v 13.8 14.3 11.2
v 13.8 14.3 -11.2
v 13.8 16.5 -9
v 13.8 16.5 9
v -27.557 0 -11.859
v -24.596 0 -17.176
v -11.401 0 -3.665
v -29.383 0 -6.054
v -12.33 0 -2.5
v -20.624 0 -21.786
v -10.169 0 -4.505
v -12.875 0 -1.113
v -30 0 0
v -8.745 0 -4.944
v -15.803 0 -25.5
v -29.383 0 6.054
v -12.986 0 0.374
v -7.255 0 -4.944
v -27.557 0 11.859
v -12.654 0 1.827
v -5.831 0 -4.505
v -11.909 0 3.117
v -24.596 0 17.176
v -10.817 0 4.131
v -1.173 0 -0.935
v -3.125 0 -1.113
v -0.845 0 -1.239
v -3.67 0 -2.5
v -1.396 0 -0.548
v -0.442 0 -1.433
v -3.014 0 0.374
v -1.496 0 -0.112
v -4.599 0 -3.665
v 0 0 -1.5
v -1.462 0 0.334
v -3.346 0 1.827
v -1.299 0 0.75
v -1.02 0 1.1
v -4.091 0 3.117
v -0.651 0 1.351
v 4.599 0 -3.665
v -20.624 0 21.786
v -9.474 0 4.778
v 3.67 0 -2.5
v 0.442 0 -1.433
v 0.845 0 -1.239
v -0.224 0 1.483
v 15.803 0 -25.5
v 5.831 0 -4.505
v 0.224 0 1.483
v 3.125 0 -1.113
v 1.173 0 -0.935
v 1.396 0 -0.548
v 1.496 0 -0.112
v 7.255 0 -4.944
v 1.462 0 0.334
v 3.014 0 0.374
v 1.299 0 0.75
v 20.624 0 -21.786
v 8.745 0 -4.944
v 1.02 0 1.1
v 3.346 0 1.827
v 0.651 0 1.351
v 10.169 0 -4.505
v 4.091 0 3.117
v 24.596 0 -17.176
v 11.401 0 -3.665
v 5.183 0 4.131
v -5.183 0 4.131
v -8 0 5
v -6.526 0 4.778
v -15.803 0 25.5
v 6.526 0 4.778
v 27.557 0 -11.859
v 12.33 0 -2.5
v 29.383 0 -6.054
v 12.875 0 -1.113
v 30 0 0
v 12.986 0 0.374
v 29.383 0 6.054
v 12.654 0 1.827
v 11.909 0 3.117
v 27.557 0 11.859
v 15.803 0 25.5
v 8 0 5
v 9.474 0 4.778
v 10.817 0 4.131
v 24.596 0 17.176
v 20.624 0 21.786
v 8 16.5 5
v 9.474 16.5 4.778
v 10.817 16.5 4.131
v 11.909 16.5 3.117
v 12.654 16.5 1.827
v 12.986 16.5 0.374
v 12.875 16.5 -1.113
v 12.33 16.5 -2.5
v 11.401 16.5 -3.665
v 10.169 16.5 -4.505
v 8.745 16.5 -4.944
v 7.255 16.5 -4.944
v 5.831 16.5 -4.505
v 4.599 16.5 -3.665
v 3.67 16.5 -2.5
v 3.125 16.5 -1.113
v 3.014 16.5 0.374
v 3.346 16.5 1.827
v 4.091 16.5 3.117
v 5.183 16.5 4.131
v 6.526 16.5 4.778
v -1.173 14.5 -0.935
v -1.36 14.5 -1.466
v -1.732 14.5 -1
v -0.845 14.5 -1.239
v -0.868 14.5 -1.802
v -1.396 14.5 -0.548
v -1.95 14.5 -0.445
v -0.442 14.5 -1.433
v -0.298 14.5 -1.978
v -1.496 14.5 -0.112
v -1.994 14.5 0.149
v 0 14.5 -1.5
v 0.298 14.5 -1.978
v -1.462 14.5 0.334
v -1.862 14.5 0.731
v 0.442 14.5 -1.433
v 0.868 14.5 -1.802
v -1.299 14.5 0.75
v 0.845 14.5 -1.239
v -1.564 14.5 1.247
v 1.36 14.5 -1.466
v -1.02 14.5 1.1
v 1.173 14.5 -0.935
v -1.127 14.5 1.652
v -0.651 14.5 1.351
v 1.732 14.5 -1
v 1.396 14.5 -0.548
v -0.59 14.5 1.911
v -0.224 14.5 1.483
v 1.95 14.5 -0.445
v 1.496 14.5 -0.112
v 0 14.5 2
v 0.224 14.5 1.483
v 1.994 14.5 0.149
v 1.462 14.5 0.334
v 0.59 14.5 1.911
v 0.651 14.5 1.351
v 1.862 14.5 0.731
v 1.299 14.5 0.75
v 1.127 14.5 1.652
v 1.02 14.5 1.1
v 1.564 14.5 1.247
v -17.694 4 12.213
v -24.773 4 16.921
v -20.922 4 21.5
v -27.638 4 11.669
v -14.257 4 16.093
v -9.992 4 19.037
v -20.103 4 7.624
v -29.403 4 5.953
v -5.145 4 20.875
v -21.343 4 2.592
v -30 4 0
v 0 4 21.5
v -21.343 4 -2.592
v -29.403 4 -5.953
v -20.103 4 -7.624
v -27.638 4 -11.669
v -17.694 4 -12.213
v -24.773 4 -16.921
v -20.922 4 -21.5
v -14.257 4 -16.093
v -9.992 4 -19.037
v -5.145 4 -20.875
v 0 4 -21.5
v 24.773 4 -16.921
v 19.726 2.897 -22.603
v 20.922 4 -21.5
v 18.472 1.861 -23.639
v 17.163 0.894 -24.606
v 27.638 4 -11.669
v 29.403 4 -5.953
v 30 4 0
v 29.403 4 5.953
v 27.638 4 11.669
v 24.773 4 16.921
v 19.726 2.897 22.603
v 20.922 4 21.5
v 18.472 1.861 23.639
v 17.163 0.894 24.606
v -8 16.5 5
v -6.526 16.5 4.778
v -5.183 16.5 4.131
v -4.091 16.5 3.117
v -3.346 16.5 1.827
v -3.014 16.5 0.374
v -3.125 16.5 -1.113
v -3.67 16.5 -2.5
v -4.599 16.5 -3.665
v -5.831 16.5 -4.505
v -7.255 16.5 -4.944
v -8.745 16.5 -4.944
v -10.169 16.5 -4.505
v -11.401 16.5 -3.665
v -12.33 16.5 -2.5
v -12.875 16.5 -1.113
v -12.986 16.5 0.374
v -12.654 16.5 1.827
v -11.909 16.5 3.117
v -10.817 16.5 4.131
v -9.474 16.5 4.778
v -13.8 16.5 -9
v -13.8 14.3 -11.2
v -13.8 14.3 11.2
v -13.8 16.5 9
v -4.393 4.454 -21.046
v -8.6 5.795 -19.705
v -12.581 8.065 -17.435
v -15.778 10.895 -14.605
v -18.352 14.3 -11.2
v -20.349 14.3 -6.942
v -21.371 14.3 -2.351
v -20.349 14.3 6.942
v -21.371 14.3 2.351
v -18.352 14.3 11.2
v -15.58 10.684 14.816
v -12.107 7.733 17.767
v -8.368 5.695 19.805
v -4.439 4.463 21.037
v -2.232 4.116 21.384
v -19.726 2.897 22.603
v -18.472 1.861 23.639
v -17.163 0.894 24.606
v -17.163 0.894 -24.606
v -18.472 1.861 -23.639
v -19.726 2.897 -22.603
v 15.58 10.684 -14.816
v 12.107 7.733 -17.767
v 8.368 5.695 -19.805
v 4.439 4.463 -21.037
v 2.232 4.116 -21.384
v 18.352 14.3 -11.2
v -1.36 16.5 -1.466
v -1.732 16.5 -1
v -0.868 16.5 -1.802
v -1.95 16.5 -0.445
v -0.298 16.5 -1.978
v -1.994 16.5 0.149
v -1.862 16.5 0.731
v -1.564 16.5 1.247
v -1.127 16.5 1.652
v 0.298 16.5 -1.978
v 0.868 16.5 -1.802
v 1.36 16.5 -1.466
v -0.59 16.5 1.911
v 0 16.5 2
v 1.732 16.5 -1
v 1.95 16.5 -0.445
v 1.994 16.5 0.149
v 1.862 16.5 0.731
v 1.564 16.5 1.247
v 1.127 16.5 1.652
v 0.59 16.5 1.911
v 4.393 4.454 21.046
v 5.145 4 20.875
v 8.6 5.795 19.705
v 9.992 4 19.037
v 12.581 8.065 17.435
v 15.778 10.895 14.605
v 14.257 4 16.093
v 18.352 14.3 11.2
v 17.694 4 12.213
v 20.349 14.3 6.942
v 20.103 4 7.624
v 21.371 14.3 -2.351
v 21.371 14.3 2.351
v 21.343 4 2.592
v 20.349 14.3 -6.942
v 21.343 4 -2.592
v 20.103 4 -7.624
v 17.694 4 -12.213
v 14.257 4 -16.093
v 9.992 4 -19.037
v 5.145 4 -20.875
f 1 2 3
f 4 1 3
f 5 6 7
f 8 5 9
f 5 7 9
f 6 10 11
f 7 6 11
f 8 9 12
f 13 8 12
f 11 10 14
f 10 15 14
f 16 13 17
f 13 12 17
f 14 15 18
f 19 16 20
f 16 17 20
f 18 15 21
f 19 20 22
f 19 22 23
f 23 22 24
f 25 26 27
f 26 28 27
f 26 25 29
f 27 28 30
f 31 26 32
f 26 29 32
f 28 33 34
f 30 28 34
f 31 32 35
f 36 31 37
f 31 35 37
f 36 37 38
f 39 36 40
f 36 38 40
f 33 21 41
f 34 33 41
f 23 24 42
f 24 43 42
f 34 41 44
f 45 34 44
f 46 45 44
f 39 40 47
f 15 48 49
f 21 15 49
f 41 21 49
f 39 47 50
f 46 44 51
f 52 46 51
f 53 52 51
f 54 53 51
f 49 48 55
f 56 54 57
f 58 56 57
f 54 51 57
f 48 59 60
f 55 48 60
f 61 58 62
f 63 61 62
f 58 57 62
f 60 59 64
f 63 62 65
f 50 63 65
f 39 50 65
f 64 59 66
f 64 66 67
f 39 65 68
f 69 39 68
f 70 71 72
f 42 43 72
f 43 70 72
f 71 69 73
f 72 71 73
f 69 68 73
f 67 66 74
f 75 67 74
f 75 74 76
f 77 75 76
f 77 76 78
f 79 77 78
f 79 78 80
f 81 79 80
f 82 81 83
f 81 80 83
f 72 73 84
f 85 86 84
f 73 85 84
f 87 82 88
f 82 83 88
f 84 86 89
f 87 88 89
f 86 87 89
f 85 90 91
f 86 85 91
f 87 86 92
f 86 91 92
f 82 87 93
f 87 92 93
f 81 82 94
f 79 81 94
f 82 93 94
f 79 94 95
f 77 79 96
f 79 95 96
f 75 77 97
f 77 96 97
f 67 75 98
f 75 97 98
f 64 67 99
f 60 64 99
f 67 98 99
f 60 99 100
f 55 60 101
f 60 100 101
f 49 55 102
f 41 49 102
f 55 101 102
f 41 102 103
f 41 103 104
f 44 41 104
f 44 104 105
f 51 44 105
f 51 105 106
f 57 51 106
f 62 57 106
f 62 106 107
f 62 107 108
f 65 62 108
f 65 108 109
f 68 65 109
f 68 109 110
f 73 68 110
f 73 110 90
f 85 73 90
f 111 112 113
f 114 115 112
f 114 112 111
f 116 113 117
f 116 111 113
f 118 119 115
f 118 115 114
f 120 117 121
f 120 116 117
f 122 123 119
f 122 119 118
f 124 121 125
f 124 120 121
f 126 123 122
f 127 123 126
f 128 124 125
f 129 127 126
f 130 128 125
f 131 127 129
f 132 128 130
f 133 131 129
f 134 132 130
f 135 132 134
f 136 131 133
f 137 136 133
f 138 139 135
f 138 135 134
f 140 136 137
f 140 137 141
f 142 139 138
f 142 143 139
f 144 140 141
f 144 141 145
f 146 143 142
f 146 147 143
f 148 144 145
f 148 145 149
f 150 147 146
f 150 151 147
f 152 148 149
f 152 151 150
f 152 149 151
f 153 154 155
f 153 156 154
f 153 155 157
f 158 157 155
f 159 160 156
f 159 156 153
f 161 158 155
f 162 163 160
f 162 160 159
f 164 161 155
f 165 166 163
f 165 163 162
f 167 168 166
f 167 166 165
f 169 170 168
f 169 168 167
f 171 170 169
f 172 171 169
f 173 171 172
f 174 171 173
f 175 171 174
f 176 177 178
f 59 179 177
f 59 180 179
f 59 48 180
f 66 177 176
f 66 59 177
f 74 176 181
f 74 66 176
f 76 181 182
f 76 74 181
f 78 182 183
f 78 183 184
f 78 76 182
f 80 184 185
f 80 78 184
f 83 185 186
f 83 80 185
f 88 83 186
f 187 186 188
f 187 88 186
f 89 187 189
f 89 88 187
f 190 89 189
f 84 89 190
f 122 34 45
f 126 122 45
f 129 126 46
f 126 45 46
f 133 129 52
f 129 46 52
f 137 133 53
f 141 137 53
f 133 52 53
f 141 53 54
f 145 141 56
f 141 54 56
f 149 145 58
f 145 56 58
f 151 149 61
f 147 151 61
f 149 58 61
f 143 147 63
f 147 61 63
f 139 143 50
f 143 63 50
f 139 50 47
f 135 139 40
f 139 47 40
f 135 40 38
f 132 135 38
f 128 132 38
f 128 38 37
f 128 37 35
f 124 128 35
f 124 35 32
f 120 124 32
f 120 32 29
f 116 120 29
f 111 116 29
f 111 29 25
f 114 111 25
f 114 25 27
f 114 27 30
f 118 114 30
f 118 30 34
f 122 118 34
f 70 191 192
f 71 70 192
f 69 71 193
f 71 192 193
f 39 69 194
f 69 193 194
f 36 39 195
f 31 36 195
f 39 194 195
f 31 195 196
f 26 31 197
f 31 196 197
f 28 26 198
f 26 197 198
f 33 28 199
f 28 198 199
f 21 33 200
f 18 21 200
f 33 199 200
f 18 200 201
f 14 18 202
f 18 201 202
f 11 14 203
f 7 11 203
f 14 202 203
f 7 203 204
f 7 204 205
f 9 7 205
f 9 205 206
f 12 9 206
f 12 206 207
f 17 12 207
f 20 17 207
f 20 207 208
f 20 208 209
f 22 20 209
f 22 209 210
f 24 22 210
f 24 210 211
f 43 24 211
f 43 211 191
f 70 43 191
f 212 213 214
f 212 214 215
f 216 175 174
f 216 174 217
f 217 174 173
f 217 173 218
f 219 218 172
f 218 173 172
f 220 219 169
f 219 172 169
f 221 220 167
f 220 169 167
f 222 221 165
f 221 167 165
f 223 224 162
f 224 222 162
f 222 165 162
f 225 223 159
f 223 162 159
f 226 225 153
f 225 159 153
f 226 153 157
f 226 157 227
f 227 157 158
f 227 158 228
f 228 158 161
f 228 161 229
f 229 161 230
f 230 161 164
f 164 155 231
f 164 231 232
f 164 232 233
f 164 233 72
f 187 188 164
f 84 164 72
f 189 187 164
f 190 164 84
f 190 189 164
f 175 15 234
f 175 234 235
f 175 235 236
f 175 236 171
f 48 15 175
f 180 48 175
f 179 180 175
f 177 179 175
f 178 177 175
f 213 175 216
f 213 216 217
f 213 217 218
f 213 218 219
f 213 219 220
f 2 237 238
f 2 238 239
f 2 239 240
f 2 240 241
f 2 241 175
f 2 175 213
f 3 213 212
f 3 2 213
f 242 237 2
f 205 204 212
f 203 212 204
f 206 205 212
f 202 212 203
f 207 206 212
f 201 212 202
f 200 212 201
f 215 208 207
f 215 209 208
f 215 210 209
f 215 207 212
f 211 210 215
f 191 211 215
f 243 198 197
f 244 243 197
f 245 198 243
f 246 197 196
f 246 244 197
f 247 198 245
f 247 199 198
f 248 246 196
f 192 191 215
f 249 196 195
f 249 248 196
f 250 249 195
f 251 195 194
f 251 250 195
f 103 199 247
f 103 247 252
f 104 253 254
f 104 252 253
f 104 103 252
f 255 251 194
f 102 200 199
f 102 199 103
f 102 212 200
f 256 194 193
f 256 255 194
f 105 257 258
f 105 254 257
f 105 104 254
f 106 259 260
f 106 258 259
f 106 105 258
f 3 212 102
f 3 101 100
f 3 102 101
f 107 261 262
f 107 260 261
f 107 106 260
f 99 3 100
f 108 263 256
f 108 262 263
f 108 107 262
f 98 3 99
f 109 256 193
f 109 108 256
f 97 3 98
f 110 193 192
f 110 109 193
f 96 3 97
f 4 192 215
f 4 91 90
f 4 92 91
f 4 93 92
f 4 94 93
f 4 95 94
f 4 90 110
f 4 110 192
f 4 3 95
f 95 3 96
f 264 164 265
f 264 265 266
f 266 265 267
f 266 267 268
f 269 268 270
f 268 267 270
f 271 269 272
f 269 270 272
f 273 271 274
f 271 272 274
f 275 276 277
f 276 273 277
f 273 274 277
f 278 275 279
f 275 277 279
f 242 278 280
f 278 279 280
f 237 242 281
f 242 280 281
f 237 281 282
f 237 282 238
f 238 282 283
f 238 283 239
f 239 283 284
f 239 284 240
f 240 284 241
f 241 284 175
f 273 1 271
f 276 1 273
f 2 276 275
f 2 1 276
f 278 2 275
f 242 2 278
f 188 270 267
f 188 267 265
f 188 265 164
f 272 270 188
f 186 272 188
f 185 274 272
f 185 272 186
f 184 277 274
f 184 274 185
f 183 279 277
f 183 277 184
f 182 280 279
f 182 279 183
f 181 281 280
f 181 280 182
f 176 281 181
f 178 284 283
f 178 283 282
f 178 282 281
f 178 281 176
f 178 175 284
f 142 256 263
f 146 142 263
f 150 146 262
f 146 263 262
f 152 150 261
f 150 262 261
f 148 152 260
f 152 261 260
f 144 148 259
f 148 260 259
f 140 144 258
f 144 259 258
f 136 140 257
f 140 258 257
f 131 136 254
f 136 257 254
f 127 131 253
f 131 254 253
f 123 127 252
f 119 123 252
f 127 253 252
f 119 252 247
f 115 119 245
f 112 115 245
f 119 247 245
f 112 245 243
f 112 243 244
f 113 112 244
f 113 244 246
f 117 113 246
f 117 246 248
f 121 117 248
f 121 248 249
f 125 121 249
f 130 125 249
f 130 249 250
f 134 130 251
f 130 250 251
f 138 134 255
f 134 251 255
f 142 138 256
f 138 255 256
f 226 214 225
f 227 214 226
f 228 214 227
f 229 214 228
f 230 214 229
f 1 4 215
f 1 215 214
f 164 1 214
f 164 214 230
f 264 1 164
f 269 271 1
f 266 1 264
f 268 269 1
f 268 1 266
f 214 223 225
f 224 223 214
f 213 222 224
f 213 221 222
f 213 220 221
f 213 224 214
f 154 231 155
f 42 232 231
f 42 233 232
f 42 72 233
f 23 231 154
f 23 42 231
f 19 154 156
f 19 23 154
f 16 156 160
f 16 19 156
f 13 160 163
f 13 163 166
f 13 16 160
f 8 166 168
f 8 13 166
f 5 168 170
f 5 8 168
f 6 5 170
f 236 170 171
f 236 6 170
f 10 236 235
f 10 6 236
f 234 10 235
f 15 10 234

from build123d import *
from build123d.topology import SkipClean

# Parameters (mm, degrees)
SKETCH1_R                            = 30
BOSS_EXTRUDE1_DEPTH                  = 4
BOSS_EXTRUDE2_REACH                  = 44.615
BOSS_EXTRUDE2_END_RADIUS             = 30
BOSS_EXTRUDE2_DIRECTION_2_REACH      = 44.615
BOSS_EXTRUDE2_DIRECTION_2_END_RADIUS = 30
SKETCH3_OUTSIDE_W                    = 78.092
SKETCH3_OUTSIDE_H                    = 69.092
SKETCH3_OUTSIDE_R                    = 21.5
CUT_EXTRUDE2_DEPTH                   = 12.5
BOSS_EXTRUDE3_DEPTH                  = 18
BOSS_EXTRUDE4_DEPTH                  = 15
BOSS_EXTRUDE5_DEPTH                  = 15
CUT_EXTRUDE3_DEPTH                   = 44.292609069
CUT_EXTRUDE3_DEPTH_BACK              = 44.292609069
SKETCH8_R                            = 2
CUT_EXTRUDE8_DEPTH                   = 48.077064479
CUT_EXTRUDE8_DEPTH_BACK              = 48.077064479
CUT_EXTRUDE9_DEPTH                   = 59.659818207
CUT_EXTRUDE11_DEPTH                  = 20
CUT_EXTRUDE12_DEPTH                  = 20
CUT_EXTRUDE13_DEPTH                  = 20
CUT_EXTRUDE14_DEPTH                  = 44.292609069
CUT_EXTRUDE14_DEPTH_BACK             = 44.292609069
SKETCH25_W                           = 66.075437062
SKETCH25_H                           = 20.142243048
SKETCH26_R                           = 5
CUT_EXTRUDE15_DEPTH                  = 24
CUT_EXTRUDE17_DEPTH                  = 47.524187258
CUT_EXTRUDE17_DEPTH_BACK             = 47.524187258
SKETCH29_W                           = 7.7
SKETCH29_H                           = 2.2
CUT_EXTRUDE18_DEPTH                  = 47.524187258
CUT_EXTRUDE18_DEPTH_BACK             = 47.524187258
SKETCH31_W                           = 7.7
SKETCH31_H                           = 2.2
SKETCH34_R                           = 1.5
CUT_EXTRUDE21_DEPTH                  = 20
SKETCH35_R                           = 2
CUT_EXTRUDE22_DEPTH                  = 2


with BuildPart() as part:
    # Sketch1 → Boss-Extrude1 (new body)
    with BuildSketch(Plane(origin=(0, 0, 0), x_dir=(1, 0, 0), z_dir=(0, 1, 0))):
        with Locations(Location((0, 0, 0), (0, 0, 270))):
            Circle(SKETCH1_R)
    extrude(amount=BOSS_EXTRUDE1_DEPTH)

    # Boss-Extrude2: up to this cylinder (the profile starts inside it)
    with SkipClean():  # the faces are left unmerged after this step: merging them gives an invalid solid
        boss_extrude2_end = Plane(origin=(0, 9.396175, 0), z_dir=(0, -1, 0)) * Cylinder(BOSS_EXTRUDE2_END_RADIUS, 150.23, mode=Mode.PRIVATE)
        # Sketch2 → Boss-Extrude2 (add, up to the surface)
        with BuildSketch(Plane(origin=(0, 0, 0), x_dir=(0, 0, -1), z_dir=(1, 0, 0)), mode=Mode.PRIVATE) as boss_extrude2_sk1:
            Polygon((0, 4), (21.5, 4), (9, 16.5), (-9, 16.5), (-21.5, 4), align=None)
        boss_extrude2_tool1 = extrude(boss_extrude2_sk1.sketch, amount=BOSS_EXTRUDE2_REACH, mode=Mode.PRIVATE) & boss_extrude2_end
        add(boss_extrude2_tool1.solids().sort_by_distance((0, 9.396175, 0))[0])

    # Boss-Extrude2 direction 2: up to this cylinder (the profile starts inside it)
    with SkipClean():  # the faces are left unmerged after this step: merging them gives an invalid solid
        boss_extrude2_direction_2_end = Plane(origin=(0, 9.396175, 0), z_dir=(0, -1, 0)) * Cylinder(BOSS_EXTRUDE2_DIRECTION_2_END_RADIUS, 150.23, mode=Mode.PRIVATE)
        # Sketch2 → Boss-Extrude2 direction 2 (add, up to the surface)
        with BuildSketch(Plane(origin=(0, 0, 0), x_dir=(0, 0, -1), z_dir=(1, 0, 0)), mode=Mode.PRIVATE) as boss_extrude2_direction_2_sk1:
            Polygon((0, 4), (21.5, 4), (9, 16.5), (-9, 16.5), (-21.5, 4), align=None)
        boss_extrude2_direction_2_tool1 = extrude(boss_extrude2_direction_2_sk1.sketch, amount=-BOSS_EXTRUDE2_DIRECTION_2_REACH, mode=Mode.PRIVATE) & boss_extrude2_direction_2_end
        add(boss_extrude2_direction_2_tool1.solids().sort_by_distance((0, 9.396175, 0))[0])

    # SurfaceCut1
    split(bisect_by=Plane(origin=(0, 12.75, -12.75), x_dir=(1, 0, 0), z_dir=(0, 0.7071067811865558, -0.7071067811865392)), keep=Keep.BOTTOM)

    # SurfaceCut2
    split(bisect_by=Plane(origin=(0, 12.75, 12.75), x_dir=(1, 0, 0), z_dir=(0, 0.7071067811865509, 0.7071067811865442)), keep=Keep.BOTTOM)

    # Sketch3 outside → Cut-Extrude2 (cut)
    with BuildSketch(Plane(origin=(0, 4, 0), x_dir=(1, 0, 0), z_dir=(0, 1, 0))):
        Rectangle(SKETCH3_OUTSIDE_W, SKETCH3_OUTSIDE_H)
        Circle(SKETCH3_OUTSIDE_R, mode=Mode.SUBTRACT)
    extrude(amount=CUT_EXTRUDE2_DEPTH, mode=Mode.SUBTRACT)

    # Sketch5 → Boss-Extrude3 (add)
    with BuildSketch(Plane(origin=(0, 0, 0), x_dir=(-1, 0, 0), z_dir=(0, -1, 0))):
        Polygon((0, -6), (-17.5, -6), (-17.5, 6), (17.5, 6), (17.5, -6), align=None)
    extrude(amount=BOSS_EXTRUDE3_DEPTH)

    # Sketch6 → Boss-Extrude4 (add)
    with BuildSketch(Plane.XZ):
        Polygon((0, 15), (7, 15), (7, 6), (-7, 6), (-7, 15), align=None)
    extrude(amount=BOSS_EXTRUDE4_DEPTH)

    # Sketch7 → Boss-Extrude5 (add)
    with BuildSketch(Plane.XZ):
        Polygon((0, -15), (7, -15), (7, -6), (-7, -6), (-7, -15), align=None)
    extrude(amount=BOSS_EXTRUDE5_DEPTH)

    # Sketch8 → Cut-Extrude3 (cut, two sides: drawn at the far end of the back side and taken through both)
    with BuildSketch(Plane.XY.offset(-CUT_EXTRUDE3_DEPTH_BACK)):
        with Locations((-12.5, -12.5)):
            Circle(SKETCH8_R)
        with Locations((12.5, -12.5)):
            Circle(SKETCH8_R)
    extrude(amount=CUT_EXTRUDE3_DEPTH + CUT_EXTRUDE3_DEPTH_BACK, mode=Mode.SUBTRACT)

    # Sketch16 → Cut-Extrude8 (cut, two sides: drawn at the far end of the back side and taken through both)
    with BuildSketch(Plane.XY.offset(6).offset(-CUT_EXTRUDE8_DEPTH_BACK)):
        Polygon((17.5, -18), (17.5, -14.5), (14, -18), align=None)
        Polygon((-17.5, -18), (-14, -18), (-17.5, -14.5), align=None)
    extrude(amount=CUT_EXTRUDE8_DEPTH + CUT_EXTRUDE8_DEPTH_BACK, mode=Mode.SUBTRACT)

    # Sketch17 → Cut-Extrude9 (cut, through all)
    with BuildSketch(Plane(origin=(10.365975269, -9.674910251, -8.062425209), x_dir=(-0.3613483622370374, 0.337258471421235, -0.8693009171531012), z_dir=(0.6355070151731325, -0.5931398808282571, -0.49428323402354774))):
        Polygon((-2.372510104, -6.189601271), (7.980636686, -0.706686759), (7.980636686, -10.965829024), align=None)
    extrude(amount=CUT_EXTRUDE9_DEPTH, mode=Mode.SUBTRACT)

    # Sketch19 → Cut-Extrude11 (cut)
    with BuildSketch(Plane(origin=(-10.365975269, -9.674910251, -8.062425209), x_dir=(0.3613483622370374, 0.33725847142123494, -0.8693009171531012), z_dir=(0.6355070151731324, 0.5931398808282571, 0.4942832340235476))):
        Polygon((-2.372510104, -6.189601271), (7.980636686, -10.965829024), (7.980636686, -0.706686759), align=None)
    extrude(amount=-CUT_EXTRUDE11_DEPTH, mode=Mode.SUBTRACT)

    # Sketch20 → Cut-Extrude12 (cut)
    with BuildSketch(Plane(origin=(-10.365975269, -9.674910251, 8.062425209), x_dir=(-0.3613483622370374, -0.3372584714212349, -0.8693009171531013), z_dir=(0.6355070151731326, 0.593139880828257, -0.49428323402354757))):
        Polygon((2.372510104, -6.189601271), (-7.980636686, -0.706686759), (-7.980636686, -10.965829024), align=None)
    extrude(amount=-CUT_EXTRUDE12_DEPTH, mode=Mode.SUBTRACT)

    # Sketch21 → Cut-Extrude13 (cut)
    with BuildSketch(Plane(origin=(10.365975269, -9.674910251, 8.062425209), x_dir=(-0.3613483622370374, 0.3372584714212349, 0.8693009171531013), z_dir=(-0.6355070151731326, 0.593139880828257, -0.49428323402354757))):
        Polygon((-2.372510104, -6.189601271), (7.980636686, -0.706686759), (7.980636686, -10.965829024), align=None)
    extrude(amount=-CUT_EXTRUDE13_DEPTH, mode=Mode.SUBTRACT)

    # Sketch25 → Cut-Extrude14 (cut, two sides: drawn at the far end of the back side and taken through both)
    with BuildSketch(Plane.XY.offset(-CUT_EXTRUDE14_DEPTH_BACK)):
        with Locations((0, -10.071121524)):
            Rectangle(SKETCH25_W, SKETCH25_H)
    extrude(amount=CUT_EXTRUDE14_DEPTH + CUT_EXTRUDE14_DEPTH_BACK, mode=Mode.SUBTRACT)

    # Sketch26 → Cut-Extrude15 (cut)
    with BuildSketch(Plane(origin=(0, 16.5, 0), x_dir=(1, 0, 0), z_dir=(0, 1, 0))):
        with Locations(Location((-8, 0, 0), (0, 0, 270))):
            Circle(SKETCH26_R)
        with Locations(Location((8, 0, 0), (0, 0, 270))):
            Circle(SKETCH26_R)
    extrude(amount=-CUT_EXTRUDE15_DEPTH, mode=Mode.SUBTRACT)

    # Sketch29 → Cut-Extrude17 (cut, two sides: drawn at the far end of the back side and taken through both)
    with BuildSketch(Plane.XY.offset(6).offset(-CUT_EXTRUDE17_DEPTH_BACK)):
        with Locations((17.65, 15.4)):
            Rectangle(SKETCH29_W, SKETCH29_H)
    extrude(amount=CUT_EXTRUDE17_DEPTH + CUT_EXTRUDE17_DEPTH_BACK, mode=Mode.SUBTRACT)

    # Sketch31 → Cut-Extrude18 (cut, two sides: drawn at the far end of the back side and taken through both)
    with BuildSketch(Plane.XY.offset(6).offset(-CUT_EXTRUDE18_DEPTH_BACK)):
        with Locations((-17.65, 15.4)):
            Rectangle(SKETCH31_W, SKETCH31_H)
    extrude(amount=CUT_EXTRUDE18_DEPTH + CUT_EXTRUDE18_DEPTH_BACK, mode=Mode.SUBTRACT)

    # Sketch34 → Cut-Extrude21 (cut)
    with BuildSketch(Plane.XZ):
        with Locations(Location((0, 0, 0), (0, 0, 270))):
            Circle(SKETCH34_R)
    extrude(amount=-CUT_EXTRUDE21_DEPTH, mode=Mode.SUBTRACT)

    # Sketch35 → Cut-Extrude22 (cut)
    with BuildSketch(Plane(origin=(0, 16.5, 0), x_dir=(1, 0, 0), z_dir=(0, 1, 0))):
        with Locations(Location((0, 0, 0), (0, 0, 270))):
            Circle(SKETCH35_R)
    extrude(amount=-CUT_EXTRUDE22_DEPTH, mode=Mode.SUBTRACT)


solid = part.part
